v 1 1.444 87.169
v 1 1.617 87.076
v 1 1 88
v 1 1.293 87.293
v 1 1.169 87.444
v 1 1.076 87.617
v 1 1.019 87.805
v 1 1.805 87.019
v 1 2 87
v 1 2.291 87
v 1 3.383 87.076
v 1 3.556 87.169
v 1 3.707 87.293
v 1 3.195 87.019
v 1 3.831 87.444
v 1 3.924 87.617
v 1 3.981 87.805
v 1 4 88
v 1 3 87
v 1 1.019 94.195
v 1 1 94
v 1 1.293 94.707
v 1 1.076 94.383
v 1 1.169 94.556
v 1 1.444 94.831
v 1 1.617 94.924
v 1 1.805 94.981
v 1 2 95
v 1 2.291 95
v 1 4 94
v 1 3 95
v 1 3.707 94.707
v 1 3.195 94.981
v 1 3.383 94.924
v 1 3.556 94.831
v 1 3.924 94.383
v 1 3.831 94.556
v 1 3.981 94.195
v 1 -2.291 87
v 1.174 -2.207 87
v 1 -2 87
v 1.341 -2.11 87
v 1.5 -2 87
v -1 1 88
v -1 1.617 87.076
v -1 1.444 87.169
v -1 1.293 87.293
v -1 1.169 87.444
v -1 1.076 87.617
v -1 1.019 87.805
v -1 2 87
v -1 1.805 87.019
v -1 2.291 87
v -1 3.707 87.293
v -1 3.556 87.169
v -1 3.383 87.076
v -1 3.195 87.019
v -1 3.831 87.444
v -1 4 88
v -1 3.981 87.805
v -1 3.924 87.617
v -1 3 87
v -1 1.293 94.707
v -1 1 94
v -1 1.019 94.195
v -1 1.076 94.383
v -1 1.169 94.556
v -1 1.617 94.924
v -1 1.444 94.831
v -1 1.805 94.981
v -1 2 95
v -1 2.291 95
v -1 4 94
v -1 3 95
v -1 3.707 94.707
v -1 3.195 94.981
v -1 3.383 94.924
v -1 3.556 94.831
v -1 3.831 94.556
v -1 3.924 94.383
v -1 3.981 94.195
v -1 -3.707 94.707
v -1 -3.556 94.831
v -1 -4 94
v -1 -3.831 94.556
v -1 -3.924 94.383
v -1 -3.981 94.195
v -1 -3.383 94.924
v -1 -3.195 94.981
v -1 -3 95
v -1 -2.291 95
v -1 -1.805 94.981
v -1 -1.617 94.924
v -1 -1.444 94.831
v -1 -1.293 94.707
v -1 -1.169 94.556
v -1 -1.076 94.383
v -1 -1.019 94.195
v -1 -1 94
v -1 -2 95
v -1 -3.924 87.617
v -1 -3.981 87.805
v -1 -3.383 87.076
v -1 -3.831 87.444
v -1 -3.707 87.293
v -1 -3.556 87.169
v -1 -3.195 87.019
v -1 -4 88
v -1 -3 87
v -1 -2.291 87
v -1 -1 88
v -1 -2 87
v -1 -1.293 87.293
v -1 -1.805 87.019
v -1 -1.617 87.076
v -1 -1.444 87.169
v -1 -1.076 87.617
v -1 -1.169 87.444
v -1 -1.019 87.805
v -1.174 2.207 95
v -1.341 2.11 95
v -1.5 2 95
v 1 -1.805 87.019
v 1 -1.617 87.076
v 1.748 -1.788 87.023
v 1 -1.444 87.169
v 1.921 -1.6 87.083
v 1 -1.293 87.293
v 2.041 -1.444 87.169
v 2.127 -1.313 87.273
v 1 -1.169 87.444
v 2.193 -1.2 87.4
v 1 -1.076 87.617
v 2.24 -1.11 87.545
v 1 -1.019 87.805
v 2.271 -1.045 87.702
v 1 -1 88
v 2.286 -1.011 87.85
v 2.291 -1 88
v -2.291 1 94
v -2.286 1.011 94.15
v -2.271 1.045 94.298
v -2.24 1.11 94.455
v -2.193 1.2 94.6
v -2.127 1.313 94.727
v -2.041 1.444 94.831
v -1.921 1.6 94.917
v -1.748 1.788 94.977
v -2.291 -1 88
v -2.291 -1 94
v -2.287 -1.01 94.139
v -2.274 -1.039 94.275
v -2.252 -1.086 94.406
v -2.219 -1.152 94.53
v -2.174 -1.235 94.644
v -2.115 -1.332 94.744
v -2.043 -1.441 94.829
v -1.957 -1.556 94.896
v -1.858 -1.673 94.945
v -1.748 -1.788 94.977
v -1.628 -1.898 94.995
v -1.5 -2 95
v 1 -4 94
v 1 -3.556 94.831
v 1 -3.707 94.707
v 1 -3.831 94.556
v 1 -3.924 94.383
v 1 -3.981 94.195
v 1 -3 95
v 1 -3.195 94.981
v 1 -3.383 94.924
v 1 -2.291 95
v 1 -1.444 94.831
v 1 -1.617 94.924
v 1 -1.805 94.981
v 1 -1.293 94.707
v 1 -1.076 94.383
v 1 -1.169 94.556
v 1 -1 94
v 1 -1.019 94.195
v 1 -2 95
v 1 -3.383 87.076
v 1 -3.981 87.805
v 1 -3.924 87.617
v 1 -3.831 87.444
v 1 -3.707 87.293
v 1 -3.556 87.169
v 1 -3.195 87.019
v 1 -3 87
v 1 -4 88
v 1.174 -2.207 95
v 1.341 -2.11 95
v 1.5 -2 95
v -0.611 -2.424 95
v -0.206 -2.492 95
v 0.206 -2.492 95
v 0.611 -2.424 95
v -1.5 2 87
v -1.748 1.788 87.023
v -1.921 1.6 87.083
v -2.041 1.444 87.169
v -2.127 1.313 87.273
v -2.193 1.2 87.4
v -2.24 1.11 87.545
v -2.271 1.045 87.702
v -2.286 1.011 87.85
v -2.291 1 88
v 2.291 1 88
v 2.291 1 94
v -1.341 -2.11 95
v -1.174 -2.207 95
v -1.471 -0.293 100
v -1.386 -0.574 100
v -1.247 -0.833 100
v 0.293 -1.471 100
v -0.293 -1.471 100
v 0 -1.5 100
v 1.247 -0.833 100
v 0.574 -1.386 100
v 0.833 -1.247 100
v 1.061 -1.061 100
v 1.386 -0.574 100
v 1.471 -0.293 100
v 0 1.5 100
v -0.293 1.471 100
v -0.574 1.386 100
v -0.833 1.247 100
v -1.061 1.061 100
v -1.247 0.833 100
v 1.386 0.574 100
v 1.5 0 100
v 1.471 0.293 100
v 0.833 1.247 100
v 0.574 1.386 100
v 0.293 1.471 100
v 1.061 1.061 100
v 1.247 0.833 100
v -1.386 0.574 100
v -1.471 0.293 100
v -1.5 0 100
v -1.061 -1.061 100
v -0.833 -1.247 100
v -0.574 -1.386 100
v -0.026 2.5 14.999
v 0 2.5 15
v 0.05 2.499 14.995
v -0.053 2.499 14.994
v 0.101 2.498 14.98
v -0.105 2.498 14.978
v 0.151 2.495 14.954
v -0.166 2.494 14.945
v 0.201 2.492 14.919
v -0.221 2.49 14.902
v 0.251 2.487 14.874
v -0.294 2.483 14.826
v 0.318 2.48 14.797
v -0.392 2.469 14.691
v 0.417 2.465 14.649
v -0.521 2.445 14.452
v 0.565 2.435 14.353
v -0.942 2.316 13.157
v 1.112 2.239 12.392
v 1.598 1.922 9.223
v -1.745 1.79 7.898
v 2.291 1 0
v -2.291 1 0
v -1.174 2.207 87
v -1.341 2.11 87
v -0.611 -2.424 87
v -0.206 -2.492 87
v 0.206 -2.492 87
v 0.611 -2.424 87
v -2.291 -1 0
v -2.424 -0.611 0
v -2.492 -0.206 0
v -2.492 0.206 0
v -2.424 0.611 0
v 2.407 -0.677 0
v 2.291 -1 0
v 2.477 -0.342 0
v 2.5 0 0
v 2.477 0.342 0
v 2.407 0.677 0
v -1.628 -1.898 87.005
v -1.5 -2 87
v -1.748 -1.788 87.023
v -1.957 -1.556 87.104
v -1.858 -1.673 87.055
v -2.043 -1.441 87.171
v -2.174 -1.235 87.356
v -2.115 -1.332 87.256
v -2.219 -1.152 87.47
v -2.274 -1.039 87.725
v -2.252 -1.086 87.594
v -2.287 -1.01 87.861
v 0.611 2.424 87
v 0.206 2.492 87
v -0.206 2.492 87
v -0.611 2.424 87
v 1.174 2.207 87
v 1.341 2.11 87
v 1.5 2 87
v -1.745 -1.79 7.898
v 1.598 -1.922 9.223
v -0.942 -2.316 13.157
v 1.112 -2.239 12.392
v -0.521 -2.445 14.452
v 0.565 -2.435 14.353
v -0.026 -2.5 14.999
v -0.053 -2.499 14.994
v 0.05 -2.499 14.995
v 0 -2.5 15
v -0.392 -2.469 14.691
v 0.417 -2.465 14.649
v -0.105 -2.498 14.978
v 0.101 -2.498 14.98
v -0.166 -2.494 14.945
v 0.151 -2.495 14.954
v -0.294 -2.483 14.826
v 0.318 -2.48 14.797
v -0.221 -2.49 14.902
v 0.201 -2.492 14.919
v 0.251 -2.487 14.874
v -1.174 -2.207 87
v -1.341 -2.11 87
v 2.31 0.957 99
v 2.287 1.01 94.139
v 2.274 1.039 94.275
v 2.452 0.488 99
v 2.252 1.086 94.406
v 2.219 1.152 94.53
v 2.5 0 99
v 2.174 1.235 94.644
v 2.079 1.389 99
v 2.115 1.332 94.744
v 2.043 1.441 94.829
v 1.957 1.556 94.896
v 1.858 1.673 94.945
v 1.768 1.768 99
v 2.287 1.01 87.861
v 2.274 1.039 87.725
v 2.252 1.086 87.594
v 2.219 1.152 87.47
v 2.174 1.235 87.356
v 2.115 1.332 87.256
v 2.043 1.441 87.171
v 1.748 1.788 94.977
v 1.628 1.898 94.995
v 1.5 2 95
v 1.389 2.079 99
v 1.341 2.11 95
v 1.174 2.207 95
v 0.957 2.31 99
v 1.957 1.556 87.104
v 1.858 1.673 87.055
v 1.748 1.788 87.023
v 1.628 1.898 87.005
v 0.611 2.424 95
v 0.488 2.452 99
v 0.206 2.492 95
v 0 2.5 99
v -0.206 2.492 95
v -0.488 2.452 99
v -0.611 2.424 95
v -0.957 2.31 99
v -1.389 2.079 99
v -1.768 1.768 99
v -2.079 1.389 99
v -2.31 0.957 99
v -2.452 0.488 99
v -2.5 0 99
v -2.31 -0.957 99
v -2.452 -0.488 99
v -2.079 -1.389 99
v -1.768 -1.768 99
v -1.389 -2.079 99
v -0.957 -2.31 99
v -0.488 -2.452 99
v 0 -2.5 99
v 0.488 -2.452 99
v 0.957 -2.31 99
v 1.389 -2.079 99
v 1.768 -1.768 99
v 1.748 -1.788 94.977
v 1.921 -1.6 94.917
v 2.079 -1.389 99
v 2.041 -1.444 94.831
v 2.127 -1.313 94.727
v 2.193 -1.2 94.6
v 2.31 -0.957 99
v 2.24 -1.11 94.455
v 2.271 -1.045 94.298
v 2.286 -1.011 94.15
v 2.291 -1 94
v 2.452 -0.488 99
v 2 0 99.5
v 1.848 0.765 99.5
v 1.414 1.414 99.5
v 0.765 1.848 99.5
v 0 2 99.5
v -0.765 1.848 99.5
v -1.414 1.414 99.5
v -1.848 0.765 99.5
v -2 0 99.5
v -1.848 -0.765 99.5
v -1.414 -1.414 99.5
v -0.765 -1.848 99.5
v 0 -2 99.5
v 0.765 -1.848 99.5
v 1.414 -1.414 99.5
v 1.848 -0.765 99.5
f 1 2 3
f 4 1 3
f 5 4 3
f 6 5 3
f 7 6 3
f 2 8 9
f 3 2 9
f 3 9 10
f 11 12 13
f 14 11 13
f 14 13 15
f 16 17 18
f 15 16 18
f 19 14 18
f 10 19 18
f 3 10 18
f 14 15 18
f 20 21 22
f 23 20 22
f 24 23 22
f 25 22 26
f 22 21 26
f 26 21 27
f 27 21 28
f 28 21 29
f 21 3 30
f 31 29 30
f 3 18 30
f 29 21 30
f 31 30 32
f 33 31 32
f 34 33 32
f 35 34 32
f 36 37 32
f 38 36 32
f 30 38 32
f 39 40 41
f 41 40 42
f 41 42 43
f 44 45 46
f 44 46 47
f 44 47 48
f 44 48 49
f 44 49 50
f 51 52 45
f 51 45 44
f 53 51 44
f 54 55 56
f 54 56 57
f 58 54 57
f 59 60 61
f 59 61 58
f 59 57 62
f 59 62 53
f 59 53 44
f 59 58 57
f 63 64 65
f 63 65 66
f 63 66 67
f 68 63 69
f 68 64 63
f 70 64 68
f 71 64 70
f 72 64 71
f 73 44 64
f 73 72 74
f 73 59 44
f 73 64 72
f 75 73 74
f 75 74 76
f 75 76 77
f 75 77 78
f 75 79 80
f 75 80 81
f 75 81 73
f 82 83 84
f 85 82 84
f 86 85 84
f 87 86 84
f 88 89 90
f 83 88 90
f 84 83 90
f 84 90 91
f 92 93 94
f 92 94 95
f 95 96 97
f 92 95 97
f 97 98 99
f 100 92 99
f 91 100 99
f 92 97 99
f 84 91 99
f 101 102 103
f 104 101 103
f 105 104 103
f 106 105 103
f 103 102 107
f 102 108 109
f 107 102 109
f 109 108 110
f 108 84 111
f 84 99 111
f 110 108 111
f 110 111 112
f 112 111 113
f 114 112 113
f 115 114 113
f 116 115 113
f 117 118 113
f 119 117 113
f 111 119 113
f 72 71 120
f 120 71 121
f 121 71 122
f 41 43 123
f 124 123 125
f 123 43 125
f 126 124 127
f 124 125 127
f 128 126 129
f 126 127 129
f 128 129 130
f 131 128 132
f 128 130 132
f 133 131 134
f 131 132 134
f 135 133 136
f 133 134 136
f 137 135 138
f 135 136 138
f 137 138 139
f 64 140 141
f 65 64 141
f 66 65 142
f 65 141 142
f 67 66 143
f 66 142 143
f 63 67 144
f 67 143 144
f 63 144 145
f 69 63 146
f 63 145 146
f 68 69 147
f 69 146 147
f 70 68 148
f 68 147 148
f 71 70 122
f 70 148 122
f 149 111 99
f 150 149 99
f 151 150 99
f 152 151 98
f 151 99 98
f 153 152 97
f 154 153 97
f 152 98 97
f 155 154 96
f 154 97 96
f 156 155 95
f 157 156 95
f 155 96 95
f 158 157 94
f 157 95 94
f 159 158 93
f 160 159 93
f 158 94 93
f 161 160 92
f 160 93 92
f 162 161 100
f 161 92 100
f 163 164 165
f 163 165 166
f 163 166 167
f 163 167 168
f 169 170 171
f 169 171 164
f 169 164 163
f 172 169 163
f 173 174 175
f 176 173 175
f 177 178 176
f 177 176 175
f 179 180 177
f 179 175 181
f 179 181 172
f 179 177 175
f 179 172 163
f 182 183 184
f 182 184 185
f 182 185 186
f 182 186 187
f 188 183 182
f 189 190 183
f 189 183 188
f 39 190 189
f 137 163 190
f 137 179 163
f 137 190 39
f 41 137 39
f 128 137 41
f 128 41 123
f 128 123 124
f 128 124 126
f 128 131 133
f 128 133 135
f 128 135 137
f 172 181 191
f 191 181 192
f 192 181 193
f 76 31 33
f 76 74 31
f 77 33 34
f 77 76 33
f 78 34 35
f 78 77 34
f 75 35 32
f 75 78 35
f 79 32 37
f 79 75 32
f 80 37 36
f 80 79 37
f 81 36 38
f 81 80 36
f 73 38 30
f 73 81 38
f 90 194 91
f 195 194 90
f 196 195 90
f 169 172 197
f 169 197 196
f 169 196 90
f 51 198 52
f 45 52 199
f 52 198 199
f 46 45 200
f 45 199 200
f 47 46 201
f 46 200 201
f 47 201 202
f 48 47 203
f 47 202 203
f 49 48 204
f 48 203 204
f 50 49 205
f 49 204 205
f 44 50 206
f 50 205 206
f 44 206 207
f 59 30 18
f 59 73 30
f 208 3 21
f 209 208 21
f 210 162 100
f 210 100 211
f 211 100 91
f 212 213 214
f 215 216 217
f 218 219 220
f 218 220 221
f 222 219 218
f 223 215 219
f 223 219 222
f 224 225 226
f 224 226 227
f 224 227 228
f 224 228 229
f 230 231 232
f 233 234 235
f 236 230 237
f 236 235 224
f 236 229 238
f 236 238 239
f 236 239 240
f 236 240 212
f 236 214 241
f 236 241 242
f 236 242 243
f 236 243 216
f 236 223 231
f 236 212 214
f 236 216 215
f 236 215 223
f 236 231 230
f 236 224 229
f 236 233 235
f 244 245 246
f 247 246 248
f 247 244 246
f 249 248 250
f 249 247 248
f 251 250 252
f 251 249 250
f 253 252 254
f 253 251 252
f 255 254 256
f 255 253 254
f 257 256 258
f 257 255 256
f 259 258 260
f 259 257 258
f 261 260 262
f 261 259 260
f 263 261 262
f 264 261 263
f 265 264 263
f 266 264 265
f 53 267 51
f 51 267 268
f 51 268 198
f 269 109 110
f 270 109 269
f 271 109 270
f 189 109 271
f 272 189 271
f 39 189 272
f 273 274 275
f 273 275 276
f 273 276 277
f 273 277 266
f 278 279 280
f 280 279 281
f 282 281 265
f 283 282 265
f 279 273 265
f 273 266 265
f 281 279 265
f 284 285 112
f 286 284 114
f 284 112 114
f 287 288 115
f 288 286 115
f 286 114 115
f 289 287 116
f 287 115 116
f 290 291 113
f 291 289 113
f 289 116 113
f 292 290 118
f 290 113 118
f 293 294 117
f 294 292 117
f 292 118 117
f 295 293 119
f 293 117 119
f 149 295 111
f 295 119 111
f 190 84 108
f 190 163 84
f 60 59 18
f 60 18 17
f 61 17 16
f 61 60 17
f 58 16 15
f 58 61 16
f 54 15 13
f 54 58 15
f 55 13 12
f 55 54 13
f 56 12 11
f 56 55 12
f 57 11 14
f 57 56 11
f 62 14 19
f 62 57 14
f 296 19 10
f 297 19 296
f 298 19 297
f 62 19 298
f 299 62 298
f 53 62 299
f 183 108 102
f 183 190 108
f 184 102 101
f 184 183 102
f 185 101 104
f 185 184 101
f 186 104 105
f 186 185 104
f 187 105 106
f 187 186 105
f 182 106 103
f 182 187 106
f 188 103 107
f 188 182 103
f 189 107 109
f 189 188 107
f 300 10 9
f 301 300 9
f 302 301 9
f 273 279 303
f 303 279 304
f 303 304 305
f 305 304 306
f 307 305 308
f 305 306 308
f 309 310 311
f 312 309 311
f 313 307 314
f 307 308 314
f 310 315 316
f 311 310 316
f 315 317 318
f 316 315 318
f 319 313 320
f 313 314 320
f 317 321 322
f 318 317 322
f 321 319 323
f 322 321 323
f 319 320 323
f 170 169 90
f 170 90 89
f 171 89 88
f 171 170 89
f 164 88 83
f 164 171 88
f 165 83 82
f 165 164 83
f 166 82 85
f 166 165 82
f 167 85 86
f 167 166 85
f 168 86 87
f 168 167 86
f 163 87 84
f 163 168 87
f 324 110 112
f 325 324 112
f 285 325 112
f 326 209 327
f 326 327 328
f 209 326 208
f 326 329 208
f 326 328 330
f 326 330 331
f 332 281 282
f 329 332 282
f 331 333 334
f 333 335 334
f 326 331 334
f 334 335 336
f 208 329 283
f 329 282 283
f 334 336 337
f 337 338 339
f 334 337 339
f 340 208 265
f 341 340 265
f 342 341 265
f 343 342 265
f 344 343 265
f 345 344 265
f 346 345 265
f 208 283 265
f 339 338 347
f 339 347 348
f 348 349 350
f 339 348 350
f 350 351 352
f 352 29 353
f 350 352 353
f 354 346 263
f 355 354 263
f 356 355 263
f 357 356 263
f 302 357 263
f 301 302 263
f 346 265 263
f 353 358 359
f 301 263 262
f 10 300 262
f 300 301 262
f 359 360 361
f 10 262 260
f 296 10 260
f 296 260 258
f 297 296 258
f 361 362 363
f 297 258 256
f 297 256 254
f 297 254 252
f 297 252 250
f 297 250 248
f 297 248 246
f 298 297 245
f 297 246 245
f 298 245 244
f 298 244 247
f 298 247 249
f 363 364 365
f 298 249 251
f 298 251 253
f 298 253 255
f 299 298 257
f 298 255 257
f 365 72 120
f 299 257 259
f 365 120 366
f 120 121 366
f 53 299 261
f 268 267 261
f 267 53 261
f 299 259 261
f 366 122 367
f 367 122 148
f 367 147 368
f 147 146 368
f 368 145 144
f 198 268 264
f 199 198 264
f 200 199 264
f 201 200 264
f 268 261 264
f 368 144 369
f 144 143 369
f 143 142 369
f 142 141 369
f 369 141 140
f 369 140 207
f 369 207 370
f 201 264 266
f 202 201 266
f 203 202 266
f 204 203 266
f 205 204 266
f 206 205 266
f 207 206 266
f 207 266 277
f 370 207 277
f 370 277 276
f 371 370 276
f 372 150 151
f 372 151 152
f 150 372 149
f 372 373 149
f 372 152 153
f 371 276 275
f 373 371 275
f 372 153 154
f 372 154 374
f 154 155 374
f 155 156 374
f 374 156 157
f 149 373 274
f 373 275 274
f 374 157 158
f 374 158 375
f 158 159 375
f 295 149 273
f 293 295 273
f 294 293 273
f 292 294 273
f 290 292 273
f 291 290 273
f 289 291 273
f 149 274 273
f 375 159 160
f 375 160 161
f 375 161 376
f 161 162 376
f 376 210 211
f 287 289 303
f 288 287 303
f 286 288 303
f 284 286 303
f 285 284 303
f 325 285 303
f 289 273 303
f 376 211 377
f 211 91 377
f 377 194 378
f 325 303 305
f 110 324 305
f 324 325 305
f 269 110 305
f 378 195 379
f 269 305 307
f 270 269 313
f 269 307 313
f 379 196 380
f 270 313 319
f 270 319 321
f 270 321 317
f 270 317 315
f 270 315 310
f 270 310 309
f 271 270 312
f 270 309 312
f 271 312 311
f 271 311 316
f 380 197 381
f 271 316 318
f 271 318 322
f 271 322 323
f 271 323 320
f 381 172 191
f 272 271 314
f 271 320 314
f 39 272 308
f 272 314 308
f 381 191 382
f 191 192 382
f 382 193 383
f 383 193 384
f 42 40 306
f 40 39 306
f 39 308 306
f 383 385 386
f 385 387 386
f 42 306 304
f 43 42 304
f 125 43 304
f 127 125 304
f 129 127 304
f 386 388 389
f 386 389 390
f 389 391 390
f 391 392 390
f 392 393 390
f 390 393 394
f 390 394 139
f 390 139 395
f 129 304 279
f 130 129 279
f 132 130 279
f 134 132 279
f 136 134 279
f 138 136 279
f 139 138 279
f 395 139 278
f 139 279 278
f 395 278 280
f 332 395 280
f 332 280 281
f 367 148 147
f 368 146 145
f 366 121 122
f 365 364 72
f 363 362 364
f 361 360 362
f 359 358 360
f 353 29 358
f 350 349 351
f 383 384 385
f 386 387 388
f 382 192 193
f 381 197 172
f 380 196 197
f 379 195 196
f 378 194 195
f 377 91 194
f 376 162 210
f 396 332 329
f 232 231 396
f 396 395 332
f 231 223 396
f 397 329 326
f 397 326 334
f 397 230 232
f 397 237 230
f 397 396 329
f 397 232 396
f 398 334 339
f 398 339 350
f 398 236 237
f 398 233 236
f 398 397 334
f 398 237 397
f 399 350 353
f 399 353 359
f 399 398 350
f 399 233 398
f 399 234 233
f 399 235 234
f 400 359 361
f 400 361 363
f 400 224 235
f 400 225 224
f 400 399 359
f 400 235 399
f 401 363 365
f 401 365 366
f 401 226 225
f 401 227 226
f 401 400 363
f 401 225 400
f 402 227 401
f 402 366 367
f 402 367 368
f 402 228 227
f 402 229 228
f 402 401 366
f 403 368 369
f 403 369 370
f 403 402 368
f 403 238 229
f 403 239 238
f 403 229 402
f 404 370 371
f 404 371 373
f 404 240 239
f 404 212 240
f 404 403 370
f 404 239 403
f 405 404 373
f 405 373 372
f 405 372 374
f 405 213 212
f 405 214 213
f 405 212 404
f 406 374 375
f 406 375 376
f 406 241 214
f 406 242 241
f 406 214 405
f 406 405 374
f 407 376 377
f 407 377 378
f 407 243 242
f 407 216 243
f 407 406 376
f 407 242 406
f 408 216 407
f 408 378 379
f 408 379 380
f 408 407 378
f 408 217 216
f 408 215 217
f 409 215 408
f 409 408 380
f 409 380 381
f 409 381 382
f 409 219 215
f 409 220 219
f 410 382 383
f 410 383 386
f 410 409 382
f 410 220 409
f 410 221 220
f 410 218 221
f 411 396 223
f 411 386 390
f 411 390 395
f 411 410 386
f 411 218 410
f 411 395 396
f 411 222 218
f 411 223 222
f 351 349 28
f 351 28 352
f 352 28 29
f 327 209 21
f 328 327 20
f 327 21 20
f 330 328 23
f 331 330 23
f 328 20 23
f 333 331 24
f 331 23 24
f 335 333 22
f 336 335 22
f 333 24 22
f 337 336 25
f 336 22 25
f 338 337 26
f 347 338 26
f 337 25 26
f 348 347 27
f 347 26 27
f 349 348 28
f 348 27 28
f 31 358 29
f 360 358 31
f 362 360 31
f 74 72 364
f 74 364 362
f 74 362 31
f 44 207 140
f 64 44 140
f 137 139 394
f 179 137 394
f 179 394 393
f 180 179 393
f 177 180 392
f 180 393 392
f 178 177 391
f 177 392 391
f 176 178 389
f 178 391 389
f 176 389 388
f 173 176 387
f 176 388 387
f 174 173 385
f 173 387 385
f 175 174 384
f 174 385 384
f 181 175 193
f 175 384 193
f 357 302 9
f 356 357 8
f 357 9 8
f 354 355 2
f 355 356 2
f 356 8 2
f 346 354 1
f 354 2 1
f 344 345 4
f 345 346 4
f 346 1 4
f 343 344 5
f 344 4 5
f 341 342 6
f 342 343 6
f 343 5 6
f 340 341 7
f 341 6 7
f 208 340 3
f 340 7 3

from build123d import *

# Parameters (mm, degrees)
SKETCH1_R           = 2.5
BOSS_EXTRUDE1_DEPTH = 100
CUT_EXTRUDE1_DEPTH  = 5
BOSS_EXTRUDE2_DEPTH = 1
CUT_EXTRUDE2_DEPTH  = 6
CHAMFER1_SIZE       = 1


with BuildPart() as part:
    # Sketch1 → Boss-Extrude1 (new body)
    with BuildSketch(Plane.XY):
        Circle(SKETCH1_R)
    extrude(amount=BOSS_EXTRUDE1_DEPTH)

    # Sketch2 → Cut-Extrude1 (cut, symmetric)
    with BuildSketch(Plane(origin=(0, 0, 0), x_dir=(0, 0, -1), z_dir=(1, 0, 0))):
        with BuildLine():
            Line((-94, 4), (-88, 4))
            ThreePointArc((-88, 4), (-87.292893219, 3.707106781), (-87, 3))
            Line((-87, 3), (-87, 2))
            ThreePointArc((-87, 2), (-87.292893219, 1.292893219), (-88, 1))
            Line((-88, 1), (-94, 1))
            ThreePointArc((-94, 1), (-94.707106781, 1.292893219), (-95, 2))
            Line((-95, 2), (-95, 3))
            ThreePointArc((-95, 3), (-94.707106781, 3.707106781), (-94, 4))
        make_face()
        with BuildLine():
            Line((-87, -3), (-87, -2))
            ThreePointArc((-87, -2), (-87.292893219, -1.292893219), (-88, -1))
            Line((-88, -1), (-94, -1))
            ThreePointArc((-94, -1), (-94.707106781, -1.292893219), (-95, -2))
            Line((-95, -2), (-95, -3))
            ThreePointArc((-95, -3), (-94.707106781, -3.707106781), (-94, -4))
            Line((-94, -4), (-88, -4))
            ThreePointArc((-88, -4), (-87.292893219, -3.707106781), (-87, -3))
        make_face()
    extrude(amount=CUT_EXTRUDE1_DEPTH, both=True, mode=Mode.SUBTRACT)

    # Sketch2<2> → Boss-Extrude2 (add, symmetric)
    with BuildSketch(Plane(origin=(0, 0, 0), x_dir=(0, 0, -1), z_dir=(1, 0, 0))):
        with BuildLine():
            Line((-94, 4), (-88, 4))
            ThreePointArc((-88, 4), (-87.292893219, 3.707106781), (-87, 3))
            Line((-87, 3), (-87, 2))
            ThreePointArc((-87, 2), (-87.292893219, 1.292893219), (-88, 1))
            Line((-88, 1), (-94, 1))
            ThreePointArc((-94, 1), (-94.707106781, 1.292893219), (-95, 2))
            Line((-95, 2), (-95, 3))
            ThreePointArc((-95, 3), (-94.707106781, 3.707106781), (-94, 4))
        make_face()
        with BuildLine():
            Line((-87, -3), (-87, -2))
            ThreePointArc((-87, -2), (-87.292893219, -1.292893219), (-88, -1))
            Line((-88, -1), (-94, -1))
            ThreePointArc((-94, -1), (-94.707106781, -1.292893219), (-95, -2))
            Line((-95, -2), (-95, -3))
            ThreePointArc((-95, -3), (-94.707106781, -3.707106781), (-94, -4))
            Line((-94, -4), (-88, -4))
            ThreePointArc((-88, -4), (-87.292893219, -3.707106781), (-87, -3))
        make_face()
    extrude(amount=BOSS_EXTRUDE2_DEPTH, both=True)

    # Sketch4 → Cut-Extrude2 (cut, symmetric)
    with BuildSketch(Plane(origin=(0, 0, 0), x_dir=(0, 0, -1), z_dir=(1, 0, 0))):
        Polygon((-15, 2.5), (0, 1), (0, 2.5), align=None)
        Polygon((0, -2.5), (0, -1), (-15, -2.5), align=None)
    extrude(amount=CUT_EXTRUDE2_DEPTH, both=True, mode=Mode.SUBTRACT)

    # Chamfer1
    chamfer1_edges = [part.edges().sort_by_distance(p)[0] for p in [
        (-2.5, 0, 100),
    ]]
    chamfer(chamfer1_edges, length=CHAMFER1_SIZE)


solid = part.part
